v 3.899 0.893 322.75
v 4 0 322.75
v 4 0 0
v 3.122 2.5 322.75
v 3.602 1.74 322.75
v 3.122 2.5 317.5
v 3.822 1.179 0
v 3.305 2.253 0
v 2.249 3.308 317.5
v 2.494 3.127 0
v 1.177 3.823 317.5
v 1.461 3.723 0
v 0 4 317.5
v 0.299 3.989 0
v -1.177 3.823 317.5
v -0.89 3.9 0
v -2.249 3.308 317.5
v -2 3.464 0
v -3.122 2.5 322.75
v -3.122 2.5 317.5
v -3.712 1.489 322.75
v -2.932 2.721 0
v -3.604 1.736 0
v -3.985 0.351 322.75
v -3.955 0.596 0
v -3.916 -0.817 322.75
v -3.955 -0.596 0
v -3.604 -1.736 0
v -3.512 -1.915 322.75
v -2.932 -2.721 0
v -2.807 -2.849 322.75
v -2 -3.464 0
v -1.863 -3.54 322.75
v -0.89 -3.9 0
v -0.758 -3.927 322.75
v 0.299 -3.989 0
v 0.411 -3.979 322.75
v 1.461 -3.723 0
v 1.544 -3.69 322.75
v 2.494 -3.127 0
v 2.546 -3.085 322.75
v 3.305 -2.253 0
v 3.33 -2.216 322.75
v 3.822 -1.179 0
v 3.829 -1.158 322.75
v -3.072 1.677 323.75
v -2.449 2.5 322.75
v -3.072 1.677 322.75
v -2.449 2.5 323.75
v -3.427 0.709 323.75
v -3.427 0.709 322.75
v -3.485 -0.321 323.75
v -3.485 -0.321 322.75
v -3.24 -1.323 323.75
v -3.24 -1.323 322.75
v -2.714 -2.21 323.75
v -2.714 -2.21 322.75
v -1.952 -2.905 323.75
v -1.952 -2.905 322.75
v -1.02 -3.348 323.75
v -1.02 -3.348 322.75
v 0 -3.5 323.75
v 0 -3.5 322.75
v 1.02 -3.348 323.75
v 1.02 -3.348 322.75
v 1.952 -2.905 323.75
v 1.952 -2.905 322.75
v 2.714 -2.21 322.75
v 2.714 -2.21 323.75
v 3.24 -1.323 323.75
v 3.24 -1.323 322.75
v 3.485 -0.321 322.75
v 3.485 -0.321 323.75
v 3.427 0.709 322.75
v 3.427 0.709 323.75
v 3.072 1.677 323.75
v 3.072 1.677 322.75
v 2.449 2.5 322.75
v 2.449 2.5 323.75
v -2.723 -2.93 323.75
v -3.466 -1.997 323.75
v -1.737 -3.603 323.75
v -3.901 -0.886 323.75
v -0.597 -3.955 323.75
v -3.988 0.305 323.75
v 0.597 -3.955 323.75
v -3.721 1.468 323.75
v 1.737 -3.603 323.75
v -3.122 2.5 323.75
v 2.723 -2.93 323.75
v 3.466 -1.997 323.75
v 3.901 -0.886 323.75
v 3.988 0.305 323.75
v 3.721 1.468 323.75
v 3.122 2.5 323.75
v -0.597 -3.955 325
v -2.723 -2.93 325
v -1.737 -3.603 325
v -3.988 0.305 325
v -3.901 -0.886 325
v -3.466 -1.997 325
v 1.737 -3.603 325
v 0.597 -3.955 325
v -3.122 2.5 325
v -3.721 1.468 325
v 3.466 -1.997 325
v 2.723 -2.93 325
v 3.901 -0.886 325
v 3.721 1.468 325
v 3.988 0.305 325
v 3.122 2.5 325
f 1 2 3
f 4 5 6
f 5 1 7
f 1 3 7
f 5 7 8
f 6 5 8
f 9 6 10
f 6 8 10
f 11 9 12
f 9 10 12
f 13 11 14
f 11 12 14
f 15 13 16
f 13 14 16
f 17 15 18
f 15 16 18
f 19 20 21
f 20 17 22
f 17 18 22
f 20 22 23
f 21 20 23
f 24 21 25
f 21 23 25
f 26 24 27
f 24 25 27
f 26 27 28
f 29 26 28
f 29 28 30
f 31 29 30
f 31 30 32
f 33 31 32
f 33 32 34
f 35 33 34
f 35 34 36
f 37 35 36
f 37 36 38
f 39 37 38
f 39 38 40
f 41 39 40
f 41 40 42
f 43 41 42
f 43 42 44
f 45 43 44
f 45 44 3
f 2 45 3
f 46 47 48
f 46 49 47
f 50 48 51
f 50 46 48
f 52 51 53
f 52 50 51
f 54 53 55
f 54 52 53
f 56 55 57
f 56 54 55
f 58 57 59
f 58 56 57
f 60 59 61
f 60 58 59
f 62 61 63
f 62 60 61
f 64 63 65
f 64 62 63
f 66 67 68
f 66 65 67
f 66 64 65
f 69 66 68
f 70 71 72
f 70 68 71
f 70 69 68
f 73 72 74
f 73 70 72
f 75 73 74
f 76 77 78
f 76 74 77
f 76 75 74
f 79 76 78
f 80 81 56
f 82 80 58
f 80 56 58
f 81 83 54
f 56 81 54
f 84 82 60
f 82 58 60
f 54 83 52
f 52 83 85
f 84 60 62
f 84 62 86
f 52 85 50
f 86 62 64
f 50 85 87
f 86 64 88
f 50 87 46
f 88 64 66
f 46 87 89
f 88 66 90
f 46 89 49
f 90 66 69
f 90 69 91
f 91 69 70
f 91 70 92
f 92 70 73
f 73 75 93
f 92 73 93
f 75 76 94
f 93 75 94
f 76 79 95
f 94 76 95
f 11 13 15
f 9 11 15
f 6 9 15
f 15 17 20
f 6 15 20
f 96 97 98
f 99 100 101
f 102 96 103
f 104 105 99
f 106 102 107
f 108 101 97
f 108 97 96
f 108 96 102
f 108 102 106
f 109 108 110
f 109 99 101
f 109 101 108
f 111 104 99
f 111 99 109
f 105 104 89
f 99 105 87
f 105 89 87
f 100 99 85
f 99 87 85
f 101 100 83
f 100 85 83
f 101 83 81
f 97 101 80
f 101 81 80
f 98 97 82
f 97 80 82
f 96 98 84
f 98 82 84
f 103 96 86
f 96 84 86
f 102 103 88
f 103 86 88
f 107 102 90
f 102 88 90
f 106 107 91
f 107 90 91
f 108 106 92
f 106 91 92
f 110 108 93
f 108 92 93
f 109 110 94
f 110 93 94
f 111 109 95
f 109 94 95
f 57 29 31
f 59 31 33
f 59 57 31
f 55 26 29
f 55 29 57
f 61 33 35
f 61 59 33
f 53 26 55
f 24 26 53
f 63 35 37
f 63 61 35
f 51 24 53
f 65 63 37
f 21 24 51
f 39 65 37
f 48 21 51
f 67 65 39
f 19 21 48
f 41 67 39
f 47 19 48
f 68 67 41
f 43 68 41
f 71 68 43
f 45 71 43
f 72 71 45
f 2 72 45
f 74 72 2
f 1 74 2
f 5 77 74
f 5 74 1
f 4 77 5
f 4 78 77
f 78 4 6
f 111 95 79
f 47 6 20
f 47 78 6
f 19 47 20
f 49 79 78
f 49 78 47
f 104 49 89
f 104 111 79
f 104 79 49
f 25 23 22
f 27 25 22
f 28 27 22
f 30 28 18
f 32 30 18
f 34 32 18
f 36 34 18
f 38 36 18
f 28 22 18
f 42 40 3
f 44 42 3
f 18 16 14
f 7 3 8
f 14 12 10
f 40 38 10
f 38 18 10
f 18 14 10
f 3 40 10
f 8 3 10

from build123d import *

# Parameters (mm, degrees)
SKETCH1_R           = 4
BOSS_EXTRUDE1_DEPTH = 325
CUT_EXTRUDE1_DEPTH  = 7.5
SKETCH3_R           = 4
SKETCH3_R_2         = 3.5
CUT_EXTRUDE2_DEPTH  = 1


with BuildPart() as part:
    # Sketch1 → Boss-Extrude1 (new body)
    with BuildSketch(Plane.XY):
        Circle(SKETCH1_R)
    extrude(amount=BOSS_EXTRUDE1_DEPTH)

    # Sketch2 → Cut-Extrude1 (cut)
    with BuildSketch(Plane.XY.offset(325)):
        with BuildLine():
            Line((3.122498999, 2.5), (-3.122498999, 2.5))
            ThreePointArc((-3.122498999, 2.5), (0, 4), (3.122498999, 2.5))
        make_face()
    extrude(amount=-CUT_EXTRUDE1_DEPTH, mode=Mode.SUBTRACT)

    # Sketch3 → Cut-Extrude2 (cut)
    with BuildSketch(Plane.XY.offset(323.75)):
        Circle(SKETCH3_R)
        Circle(SKETCH3_R_2, mode=Mode.SUBTRACT)
    extrude(amount=-CUT_EXTRUDE2_DEPTH, mode=Mode.SUBTRACT)


solid = part.part
